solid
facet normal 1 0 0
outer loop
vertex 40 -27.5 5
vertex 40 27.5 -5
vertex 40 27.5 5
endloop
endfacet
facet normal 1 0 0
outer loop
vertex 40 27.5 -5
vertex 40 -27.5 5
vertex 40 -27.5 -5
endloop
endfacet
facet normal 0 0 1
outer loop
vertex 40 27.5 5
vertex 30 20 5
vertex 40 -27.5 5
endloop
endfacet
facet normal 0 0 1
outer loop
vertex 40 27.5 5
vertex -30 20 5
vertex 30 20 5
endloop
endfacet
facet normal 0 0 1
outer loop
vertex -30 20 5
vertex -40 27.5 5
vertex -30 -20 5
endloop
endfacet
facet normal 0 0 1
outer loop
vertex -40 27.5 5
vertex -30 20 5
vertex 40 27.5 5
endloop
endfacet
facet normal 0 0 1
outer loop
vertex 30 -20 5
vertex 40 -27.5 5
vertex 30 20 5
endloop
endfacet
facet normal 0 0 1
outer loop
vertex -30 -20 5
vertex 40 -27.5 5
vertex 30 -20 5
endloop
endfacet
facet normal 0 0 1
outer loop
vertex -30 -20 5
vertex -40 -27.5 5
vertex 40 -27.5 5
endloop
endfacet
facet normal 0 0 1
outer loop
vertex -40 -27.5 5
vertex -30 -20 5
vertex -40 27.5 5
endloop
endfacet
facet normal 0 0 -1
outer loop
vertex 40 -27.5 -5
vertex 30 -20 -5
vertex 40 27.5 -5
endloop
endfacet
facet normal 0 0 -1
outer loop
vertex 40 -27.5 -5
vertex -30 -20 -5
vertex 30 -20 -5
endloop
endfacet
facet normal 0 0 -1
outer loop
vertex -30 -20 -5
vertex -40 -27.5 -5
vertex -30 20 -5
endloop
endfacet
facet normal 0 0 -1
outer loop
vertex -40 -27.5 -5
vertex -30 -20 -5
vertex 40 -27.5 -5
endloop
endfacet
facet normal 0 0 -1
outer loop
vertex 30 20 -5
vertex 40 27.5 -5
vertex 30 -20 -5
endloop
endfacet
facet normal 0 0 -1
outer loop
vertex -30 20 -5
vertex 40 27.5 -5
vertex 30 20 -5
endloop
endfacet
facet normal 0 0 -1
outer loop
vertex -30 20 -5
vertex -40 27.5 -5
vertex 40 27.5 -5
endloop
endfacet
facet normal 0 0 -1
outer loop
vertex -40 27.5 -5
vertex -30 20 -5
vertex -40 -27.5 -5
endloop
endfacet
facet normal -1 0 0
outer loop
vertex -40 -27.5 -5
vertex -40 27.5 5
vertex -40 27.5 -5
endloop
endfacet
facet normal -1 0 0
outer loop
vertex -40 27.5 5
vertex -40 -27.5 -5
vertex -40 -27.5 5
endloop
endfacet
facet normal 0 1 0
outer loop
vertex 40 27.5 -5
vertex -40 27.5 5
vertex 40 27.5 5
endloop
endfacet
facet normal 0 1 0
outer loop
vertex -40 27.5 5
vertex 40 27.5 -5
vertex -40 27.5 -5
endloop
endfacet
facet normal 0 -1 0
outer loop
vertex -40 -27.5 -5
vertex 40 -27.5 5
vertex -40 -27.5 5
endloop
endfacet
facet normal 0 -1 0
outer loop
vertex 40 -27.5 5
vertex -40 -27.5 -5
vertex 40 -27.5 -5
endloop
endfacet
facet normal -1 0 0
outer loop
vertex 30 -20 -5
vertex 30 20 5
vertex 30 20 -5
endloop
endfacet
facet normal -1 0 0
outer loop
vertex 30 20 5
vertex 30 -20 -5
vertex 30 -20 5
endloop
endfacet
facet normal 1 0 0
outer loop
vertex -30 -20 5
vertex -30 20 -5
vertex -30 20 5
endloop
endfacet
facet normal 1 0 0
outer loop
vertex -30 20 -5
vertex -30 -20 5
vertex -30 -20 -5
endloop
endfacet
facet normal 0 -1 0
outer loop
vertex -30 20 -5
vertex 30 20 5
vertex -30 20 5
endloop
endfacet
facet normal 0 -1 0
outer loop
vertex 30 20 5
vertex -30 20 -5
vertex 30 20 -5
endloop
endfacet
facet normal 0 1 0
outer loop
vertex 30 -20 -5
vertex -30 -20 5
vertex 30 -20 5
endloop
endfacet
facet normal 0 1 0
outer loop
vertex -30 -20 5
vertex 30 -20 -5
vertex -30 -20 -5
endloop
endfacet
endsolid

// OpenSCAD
$fn=300;
difference () {
cube([80,55,10],center=true);
cube([60,40,10] , center=true) ;
    linear_extrude (2) offset(r=2) cube ([80,55,10]);
}
